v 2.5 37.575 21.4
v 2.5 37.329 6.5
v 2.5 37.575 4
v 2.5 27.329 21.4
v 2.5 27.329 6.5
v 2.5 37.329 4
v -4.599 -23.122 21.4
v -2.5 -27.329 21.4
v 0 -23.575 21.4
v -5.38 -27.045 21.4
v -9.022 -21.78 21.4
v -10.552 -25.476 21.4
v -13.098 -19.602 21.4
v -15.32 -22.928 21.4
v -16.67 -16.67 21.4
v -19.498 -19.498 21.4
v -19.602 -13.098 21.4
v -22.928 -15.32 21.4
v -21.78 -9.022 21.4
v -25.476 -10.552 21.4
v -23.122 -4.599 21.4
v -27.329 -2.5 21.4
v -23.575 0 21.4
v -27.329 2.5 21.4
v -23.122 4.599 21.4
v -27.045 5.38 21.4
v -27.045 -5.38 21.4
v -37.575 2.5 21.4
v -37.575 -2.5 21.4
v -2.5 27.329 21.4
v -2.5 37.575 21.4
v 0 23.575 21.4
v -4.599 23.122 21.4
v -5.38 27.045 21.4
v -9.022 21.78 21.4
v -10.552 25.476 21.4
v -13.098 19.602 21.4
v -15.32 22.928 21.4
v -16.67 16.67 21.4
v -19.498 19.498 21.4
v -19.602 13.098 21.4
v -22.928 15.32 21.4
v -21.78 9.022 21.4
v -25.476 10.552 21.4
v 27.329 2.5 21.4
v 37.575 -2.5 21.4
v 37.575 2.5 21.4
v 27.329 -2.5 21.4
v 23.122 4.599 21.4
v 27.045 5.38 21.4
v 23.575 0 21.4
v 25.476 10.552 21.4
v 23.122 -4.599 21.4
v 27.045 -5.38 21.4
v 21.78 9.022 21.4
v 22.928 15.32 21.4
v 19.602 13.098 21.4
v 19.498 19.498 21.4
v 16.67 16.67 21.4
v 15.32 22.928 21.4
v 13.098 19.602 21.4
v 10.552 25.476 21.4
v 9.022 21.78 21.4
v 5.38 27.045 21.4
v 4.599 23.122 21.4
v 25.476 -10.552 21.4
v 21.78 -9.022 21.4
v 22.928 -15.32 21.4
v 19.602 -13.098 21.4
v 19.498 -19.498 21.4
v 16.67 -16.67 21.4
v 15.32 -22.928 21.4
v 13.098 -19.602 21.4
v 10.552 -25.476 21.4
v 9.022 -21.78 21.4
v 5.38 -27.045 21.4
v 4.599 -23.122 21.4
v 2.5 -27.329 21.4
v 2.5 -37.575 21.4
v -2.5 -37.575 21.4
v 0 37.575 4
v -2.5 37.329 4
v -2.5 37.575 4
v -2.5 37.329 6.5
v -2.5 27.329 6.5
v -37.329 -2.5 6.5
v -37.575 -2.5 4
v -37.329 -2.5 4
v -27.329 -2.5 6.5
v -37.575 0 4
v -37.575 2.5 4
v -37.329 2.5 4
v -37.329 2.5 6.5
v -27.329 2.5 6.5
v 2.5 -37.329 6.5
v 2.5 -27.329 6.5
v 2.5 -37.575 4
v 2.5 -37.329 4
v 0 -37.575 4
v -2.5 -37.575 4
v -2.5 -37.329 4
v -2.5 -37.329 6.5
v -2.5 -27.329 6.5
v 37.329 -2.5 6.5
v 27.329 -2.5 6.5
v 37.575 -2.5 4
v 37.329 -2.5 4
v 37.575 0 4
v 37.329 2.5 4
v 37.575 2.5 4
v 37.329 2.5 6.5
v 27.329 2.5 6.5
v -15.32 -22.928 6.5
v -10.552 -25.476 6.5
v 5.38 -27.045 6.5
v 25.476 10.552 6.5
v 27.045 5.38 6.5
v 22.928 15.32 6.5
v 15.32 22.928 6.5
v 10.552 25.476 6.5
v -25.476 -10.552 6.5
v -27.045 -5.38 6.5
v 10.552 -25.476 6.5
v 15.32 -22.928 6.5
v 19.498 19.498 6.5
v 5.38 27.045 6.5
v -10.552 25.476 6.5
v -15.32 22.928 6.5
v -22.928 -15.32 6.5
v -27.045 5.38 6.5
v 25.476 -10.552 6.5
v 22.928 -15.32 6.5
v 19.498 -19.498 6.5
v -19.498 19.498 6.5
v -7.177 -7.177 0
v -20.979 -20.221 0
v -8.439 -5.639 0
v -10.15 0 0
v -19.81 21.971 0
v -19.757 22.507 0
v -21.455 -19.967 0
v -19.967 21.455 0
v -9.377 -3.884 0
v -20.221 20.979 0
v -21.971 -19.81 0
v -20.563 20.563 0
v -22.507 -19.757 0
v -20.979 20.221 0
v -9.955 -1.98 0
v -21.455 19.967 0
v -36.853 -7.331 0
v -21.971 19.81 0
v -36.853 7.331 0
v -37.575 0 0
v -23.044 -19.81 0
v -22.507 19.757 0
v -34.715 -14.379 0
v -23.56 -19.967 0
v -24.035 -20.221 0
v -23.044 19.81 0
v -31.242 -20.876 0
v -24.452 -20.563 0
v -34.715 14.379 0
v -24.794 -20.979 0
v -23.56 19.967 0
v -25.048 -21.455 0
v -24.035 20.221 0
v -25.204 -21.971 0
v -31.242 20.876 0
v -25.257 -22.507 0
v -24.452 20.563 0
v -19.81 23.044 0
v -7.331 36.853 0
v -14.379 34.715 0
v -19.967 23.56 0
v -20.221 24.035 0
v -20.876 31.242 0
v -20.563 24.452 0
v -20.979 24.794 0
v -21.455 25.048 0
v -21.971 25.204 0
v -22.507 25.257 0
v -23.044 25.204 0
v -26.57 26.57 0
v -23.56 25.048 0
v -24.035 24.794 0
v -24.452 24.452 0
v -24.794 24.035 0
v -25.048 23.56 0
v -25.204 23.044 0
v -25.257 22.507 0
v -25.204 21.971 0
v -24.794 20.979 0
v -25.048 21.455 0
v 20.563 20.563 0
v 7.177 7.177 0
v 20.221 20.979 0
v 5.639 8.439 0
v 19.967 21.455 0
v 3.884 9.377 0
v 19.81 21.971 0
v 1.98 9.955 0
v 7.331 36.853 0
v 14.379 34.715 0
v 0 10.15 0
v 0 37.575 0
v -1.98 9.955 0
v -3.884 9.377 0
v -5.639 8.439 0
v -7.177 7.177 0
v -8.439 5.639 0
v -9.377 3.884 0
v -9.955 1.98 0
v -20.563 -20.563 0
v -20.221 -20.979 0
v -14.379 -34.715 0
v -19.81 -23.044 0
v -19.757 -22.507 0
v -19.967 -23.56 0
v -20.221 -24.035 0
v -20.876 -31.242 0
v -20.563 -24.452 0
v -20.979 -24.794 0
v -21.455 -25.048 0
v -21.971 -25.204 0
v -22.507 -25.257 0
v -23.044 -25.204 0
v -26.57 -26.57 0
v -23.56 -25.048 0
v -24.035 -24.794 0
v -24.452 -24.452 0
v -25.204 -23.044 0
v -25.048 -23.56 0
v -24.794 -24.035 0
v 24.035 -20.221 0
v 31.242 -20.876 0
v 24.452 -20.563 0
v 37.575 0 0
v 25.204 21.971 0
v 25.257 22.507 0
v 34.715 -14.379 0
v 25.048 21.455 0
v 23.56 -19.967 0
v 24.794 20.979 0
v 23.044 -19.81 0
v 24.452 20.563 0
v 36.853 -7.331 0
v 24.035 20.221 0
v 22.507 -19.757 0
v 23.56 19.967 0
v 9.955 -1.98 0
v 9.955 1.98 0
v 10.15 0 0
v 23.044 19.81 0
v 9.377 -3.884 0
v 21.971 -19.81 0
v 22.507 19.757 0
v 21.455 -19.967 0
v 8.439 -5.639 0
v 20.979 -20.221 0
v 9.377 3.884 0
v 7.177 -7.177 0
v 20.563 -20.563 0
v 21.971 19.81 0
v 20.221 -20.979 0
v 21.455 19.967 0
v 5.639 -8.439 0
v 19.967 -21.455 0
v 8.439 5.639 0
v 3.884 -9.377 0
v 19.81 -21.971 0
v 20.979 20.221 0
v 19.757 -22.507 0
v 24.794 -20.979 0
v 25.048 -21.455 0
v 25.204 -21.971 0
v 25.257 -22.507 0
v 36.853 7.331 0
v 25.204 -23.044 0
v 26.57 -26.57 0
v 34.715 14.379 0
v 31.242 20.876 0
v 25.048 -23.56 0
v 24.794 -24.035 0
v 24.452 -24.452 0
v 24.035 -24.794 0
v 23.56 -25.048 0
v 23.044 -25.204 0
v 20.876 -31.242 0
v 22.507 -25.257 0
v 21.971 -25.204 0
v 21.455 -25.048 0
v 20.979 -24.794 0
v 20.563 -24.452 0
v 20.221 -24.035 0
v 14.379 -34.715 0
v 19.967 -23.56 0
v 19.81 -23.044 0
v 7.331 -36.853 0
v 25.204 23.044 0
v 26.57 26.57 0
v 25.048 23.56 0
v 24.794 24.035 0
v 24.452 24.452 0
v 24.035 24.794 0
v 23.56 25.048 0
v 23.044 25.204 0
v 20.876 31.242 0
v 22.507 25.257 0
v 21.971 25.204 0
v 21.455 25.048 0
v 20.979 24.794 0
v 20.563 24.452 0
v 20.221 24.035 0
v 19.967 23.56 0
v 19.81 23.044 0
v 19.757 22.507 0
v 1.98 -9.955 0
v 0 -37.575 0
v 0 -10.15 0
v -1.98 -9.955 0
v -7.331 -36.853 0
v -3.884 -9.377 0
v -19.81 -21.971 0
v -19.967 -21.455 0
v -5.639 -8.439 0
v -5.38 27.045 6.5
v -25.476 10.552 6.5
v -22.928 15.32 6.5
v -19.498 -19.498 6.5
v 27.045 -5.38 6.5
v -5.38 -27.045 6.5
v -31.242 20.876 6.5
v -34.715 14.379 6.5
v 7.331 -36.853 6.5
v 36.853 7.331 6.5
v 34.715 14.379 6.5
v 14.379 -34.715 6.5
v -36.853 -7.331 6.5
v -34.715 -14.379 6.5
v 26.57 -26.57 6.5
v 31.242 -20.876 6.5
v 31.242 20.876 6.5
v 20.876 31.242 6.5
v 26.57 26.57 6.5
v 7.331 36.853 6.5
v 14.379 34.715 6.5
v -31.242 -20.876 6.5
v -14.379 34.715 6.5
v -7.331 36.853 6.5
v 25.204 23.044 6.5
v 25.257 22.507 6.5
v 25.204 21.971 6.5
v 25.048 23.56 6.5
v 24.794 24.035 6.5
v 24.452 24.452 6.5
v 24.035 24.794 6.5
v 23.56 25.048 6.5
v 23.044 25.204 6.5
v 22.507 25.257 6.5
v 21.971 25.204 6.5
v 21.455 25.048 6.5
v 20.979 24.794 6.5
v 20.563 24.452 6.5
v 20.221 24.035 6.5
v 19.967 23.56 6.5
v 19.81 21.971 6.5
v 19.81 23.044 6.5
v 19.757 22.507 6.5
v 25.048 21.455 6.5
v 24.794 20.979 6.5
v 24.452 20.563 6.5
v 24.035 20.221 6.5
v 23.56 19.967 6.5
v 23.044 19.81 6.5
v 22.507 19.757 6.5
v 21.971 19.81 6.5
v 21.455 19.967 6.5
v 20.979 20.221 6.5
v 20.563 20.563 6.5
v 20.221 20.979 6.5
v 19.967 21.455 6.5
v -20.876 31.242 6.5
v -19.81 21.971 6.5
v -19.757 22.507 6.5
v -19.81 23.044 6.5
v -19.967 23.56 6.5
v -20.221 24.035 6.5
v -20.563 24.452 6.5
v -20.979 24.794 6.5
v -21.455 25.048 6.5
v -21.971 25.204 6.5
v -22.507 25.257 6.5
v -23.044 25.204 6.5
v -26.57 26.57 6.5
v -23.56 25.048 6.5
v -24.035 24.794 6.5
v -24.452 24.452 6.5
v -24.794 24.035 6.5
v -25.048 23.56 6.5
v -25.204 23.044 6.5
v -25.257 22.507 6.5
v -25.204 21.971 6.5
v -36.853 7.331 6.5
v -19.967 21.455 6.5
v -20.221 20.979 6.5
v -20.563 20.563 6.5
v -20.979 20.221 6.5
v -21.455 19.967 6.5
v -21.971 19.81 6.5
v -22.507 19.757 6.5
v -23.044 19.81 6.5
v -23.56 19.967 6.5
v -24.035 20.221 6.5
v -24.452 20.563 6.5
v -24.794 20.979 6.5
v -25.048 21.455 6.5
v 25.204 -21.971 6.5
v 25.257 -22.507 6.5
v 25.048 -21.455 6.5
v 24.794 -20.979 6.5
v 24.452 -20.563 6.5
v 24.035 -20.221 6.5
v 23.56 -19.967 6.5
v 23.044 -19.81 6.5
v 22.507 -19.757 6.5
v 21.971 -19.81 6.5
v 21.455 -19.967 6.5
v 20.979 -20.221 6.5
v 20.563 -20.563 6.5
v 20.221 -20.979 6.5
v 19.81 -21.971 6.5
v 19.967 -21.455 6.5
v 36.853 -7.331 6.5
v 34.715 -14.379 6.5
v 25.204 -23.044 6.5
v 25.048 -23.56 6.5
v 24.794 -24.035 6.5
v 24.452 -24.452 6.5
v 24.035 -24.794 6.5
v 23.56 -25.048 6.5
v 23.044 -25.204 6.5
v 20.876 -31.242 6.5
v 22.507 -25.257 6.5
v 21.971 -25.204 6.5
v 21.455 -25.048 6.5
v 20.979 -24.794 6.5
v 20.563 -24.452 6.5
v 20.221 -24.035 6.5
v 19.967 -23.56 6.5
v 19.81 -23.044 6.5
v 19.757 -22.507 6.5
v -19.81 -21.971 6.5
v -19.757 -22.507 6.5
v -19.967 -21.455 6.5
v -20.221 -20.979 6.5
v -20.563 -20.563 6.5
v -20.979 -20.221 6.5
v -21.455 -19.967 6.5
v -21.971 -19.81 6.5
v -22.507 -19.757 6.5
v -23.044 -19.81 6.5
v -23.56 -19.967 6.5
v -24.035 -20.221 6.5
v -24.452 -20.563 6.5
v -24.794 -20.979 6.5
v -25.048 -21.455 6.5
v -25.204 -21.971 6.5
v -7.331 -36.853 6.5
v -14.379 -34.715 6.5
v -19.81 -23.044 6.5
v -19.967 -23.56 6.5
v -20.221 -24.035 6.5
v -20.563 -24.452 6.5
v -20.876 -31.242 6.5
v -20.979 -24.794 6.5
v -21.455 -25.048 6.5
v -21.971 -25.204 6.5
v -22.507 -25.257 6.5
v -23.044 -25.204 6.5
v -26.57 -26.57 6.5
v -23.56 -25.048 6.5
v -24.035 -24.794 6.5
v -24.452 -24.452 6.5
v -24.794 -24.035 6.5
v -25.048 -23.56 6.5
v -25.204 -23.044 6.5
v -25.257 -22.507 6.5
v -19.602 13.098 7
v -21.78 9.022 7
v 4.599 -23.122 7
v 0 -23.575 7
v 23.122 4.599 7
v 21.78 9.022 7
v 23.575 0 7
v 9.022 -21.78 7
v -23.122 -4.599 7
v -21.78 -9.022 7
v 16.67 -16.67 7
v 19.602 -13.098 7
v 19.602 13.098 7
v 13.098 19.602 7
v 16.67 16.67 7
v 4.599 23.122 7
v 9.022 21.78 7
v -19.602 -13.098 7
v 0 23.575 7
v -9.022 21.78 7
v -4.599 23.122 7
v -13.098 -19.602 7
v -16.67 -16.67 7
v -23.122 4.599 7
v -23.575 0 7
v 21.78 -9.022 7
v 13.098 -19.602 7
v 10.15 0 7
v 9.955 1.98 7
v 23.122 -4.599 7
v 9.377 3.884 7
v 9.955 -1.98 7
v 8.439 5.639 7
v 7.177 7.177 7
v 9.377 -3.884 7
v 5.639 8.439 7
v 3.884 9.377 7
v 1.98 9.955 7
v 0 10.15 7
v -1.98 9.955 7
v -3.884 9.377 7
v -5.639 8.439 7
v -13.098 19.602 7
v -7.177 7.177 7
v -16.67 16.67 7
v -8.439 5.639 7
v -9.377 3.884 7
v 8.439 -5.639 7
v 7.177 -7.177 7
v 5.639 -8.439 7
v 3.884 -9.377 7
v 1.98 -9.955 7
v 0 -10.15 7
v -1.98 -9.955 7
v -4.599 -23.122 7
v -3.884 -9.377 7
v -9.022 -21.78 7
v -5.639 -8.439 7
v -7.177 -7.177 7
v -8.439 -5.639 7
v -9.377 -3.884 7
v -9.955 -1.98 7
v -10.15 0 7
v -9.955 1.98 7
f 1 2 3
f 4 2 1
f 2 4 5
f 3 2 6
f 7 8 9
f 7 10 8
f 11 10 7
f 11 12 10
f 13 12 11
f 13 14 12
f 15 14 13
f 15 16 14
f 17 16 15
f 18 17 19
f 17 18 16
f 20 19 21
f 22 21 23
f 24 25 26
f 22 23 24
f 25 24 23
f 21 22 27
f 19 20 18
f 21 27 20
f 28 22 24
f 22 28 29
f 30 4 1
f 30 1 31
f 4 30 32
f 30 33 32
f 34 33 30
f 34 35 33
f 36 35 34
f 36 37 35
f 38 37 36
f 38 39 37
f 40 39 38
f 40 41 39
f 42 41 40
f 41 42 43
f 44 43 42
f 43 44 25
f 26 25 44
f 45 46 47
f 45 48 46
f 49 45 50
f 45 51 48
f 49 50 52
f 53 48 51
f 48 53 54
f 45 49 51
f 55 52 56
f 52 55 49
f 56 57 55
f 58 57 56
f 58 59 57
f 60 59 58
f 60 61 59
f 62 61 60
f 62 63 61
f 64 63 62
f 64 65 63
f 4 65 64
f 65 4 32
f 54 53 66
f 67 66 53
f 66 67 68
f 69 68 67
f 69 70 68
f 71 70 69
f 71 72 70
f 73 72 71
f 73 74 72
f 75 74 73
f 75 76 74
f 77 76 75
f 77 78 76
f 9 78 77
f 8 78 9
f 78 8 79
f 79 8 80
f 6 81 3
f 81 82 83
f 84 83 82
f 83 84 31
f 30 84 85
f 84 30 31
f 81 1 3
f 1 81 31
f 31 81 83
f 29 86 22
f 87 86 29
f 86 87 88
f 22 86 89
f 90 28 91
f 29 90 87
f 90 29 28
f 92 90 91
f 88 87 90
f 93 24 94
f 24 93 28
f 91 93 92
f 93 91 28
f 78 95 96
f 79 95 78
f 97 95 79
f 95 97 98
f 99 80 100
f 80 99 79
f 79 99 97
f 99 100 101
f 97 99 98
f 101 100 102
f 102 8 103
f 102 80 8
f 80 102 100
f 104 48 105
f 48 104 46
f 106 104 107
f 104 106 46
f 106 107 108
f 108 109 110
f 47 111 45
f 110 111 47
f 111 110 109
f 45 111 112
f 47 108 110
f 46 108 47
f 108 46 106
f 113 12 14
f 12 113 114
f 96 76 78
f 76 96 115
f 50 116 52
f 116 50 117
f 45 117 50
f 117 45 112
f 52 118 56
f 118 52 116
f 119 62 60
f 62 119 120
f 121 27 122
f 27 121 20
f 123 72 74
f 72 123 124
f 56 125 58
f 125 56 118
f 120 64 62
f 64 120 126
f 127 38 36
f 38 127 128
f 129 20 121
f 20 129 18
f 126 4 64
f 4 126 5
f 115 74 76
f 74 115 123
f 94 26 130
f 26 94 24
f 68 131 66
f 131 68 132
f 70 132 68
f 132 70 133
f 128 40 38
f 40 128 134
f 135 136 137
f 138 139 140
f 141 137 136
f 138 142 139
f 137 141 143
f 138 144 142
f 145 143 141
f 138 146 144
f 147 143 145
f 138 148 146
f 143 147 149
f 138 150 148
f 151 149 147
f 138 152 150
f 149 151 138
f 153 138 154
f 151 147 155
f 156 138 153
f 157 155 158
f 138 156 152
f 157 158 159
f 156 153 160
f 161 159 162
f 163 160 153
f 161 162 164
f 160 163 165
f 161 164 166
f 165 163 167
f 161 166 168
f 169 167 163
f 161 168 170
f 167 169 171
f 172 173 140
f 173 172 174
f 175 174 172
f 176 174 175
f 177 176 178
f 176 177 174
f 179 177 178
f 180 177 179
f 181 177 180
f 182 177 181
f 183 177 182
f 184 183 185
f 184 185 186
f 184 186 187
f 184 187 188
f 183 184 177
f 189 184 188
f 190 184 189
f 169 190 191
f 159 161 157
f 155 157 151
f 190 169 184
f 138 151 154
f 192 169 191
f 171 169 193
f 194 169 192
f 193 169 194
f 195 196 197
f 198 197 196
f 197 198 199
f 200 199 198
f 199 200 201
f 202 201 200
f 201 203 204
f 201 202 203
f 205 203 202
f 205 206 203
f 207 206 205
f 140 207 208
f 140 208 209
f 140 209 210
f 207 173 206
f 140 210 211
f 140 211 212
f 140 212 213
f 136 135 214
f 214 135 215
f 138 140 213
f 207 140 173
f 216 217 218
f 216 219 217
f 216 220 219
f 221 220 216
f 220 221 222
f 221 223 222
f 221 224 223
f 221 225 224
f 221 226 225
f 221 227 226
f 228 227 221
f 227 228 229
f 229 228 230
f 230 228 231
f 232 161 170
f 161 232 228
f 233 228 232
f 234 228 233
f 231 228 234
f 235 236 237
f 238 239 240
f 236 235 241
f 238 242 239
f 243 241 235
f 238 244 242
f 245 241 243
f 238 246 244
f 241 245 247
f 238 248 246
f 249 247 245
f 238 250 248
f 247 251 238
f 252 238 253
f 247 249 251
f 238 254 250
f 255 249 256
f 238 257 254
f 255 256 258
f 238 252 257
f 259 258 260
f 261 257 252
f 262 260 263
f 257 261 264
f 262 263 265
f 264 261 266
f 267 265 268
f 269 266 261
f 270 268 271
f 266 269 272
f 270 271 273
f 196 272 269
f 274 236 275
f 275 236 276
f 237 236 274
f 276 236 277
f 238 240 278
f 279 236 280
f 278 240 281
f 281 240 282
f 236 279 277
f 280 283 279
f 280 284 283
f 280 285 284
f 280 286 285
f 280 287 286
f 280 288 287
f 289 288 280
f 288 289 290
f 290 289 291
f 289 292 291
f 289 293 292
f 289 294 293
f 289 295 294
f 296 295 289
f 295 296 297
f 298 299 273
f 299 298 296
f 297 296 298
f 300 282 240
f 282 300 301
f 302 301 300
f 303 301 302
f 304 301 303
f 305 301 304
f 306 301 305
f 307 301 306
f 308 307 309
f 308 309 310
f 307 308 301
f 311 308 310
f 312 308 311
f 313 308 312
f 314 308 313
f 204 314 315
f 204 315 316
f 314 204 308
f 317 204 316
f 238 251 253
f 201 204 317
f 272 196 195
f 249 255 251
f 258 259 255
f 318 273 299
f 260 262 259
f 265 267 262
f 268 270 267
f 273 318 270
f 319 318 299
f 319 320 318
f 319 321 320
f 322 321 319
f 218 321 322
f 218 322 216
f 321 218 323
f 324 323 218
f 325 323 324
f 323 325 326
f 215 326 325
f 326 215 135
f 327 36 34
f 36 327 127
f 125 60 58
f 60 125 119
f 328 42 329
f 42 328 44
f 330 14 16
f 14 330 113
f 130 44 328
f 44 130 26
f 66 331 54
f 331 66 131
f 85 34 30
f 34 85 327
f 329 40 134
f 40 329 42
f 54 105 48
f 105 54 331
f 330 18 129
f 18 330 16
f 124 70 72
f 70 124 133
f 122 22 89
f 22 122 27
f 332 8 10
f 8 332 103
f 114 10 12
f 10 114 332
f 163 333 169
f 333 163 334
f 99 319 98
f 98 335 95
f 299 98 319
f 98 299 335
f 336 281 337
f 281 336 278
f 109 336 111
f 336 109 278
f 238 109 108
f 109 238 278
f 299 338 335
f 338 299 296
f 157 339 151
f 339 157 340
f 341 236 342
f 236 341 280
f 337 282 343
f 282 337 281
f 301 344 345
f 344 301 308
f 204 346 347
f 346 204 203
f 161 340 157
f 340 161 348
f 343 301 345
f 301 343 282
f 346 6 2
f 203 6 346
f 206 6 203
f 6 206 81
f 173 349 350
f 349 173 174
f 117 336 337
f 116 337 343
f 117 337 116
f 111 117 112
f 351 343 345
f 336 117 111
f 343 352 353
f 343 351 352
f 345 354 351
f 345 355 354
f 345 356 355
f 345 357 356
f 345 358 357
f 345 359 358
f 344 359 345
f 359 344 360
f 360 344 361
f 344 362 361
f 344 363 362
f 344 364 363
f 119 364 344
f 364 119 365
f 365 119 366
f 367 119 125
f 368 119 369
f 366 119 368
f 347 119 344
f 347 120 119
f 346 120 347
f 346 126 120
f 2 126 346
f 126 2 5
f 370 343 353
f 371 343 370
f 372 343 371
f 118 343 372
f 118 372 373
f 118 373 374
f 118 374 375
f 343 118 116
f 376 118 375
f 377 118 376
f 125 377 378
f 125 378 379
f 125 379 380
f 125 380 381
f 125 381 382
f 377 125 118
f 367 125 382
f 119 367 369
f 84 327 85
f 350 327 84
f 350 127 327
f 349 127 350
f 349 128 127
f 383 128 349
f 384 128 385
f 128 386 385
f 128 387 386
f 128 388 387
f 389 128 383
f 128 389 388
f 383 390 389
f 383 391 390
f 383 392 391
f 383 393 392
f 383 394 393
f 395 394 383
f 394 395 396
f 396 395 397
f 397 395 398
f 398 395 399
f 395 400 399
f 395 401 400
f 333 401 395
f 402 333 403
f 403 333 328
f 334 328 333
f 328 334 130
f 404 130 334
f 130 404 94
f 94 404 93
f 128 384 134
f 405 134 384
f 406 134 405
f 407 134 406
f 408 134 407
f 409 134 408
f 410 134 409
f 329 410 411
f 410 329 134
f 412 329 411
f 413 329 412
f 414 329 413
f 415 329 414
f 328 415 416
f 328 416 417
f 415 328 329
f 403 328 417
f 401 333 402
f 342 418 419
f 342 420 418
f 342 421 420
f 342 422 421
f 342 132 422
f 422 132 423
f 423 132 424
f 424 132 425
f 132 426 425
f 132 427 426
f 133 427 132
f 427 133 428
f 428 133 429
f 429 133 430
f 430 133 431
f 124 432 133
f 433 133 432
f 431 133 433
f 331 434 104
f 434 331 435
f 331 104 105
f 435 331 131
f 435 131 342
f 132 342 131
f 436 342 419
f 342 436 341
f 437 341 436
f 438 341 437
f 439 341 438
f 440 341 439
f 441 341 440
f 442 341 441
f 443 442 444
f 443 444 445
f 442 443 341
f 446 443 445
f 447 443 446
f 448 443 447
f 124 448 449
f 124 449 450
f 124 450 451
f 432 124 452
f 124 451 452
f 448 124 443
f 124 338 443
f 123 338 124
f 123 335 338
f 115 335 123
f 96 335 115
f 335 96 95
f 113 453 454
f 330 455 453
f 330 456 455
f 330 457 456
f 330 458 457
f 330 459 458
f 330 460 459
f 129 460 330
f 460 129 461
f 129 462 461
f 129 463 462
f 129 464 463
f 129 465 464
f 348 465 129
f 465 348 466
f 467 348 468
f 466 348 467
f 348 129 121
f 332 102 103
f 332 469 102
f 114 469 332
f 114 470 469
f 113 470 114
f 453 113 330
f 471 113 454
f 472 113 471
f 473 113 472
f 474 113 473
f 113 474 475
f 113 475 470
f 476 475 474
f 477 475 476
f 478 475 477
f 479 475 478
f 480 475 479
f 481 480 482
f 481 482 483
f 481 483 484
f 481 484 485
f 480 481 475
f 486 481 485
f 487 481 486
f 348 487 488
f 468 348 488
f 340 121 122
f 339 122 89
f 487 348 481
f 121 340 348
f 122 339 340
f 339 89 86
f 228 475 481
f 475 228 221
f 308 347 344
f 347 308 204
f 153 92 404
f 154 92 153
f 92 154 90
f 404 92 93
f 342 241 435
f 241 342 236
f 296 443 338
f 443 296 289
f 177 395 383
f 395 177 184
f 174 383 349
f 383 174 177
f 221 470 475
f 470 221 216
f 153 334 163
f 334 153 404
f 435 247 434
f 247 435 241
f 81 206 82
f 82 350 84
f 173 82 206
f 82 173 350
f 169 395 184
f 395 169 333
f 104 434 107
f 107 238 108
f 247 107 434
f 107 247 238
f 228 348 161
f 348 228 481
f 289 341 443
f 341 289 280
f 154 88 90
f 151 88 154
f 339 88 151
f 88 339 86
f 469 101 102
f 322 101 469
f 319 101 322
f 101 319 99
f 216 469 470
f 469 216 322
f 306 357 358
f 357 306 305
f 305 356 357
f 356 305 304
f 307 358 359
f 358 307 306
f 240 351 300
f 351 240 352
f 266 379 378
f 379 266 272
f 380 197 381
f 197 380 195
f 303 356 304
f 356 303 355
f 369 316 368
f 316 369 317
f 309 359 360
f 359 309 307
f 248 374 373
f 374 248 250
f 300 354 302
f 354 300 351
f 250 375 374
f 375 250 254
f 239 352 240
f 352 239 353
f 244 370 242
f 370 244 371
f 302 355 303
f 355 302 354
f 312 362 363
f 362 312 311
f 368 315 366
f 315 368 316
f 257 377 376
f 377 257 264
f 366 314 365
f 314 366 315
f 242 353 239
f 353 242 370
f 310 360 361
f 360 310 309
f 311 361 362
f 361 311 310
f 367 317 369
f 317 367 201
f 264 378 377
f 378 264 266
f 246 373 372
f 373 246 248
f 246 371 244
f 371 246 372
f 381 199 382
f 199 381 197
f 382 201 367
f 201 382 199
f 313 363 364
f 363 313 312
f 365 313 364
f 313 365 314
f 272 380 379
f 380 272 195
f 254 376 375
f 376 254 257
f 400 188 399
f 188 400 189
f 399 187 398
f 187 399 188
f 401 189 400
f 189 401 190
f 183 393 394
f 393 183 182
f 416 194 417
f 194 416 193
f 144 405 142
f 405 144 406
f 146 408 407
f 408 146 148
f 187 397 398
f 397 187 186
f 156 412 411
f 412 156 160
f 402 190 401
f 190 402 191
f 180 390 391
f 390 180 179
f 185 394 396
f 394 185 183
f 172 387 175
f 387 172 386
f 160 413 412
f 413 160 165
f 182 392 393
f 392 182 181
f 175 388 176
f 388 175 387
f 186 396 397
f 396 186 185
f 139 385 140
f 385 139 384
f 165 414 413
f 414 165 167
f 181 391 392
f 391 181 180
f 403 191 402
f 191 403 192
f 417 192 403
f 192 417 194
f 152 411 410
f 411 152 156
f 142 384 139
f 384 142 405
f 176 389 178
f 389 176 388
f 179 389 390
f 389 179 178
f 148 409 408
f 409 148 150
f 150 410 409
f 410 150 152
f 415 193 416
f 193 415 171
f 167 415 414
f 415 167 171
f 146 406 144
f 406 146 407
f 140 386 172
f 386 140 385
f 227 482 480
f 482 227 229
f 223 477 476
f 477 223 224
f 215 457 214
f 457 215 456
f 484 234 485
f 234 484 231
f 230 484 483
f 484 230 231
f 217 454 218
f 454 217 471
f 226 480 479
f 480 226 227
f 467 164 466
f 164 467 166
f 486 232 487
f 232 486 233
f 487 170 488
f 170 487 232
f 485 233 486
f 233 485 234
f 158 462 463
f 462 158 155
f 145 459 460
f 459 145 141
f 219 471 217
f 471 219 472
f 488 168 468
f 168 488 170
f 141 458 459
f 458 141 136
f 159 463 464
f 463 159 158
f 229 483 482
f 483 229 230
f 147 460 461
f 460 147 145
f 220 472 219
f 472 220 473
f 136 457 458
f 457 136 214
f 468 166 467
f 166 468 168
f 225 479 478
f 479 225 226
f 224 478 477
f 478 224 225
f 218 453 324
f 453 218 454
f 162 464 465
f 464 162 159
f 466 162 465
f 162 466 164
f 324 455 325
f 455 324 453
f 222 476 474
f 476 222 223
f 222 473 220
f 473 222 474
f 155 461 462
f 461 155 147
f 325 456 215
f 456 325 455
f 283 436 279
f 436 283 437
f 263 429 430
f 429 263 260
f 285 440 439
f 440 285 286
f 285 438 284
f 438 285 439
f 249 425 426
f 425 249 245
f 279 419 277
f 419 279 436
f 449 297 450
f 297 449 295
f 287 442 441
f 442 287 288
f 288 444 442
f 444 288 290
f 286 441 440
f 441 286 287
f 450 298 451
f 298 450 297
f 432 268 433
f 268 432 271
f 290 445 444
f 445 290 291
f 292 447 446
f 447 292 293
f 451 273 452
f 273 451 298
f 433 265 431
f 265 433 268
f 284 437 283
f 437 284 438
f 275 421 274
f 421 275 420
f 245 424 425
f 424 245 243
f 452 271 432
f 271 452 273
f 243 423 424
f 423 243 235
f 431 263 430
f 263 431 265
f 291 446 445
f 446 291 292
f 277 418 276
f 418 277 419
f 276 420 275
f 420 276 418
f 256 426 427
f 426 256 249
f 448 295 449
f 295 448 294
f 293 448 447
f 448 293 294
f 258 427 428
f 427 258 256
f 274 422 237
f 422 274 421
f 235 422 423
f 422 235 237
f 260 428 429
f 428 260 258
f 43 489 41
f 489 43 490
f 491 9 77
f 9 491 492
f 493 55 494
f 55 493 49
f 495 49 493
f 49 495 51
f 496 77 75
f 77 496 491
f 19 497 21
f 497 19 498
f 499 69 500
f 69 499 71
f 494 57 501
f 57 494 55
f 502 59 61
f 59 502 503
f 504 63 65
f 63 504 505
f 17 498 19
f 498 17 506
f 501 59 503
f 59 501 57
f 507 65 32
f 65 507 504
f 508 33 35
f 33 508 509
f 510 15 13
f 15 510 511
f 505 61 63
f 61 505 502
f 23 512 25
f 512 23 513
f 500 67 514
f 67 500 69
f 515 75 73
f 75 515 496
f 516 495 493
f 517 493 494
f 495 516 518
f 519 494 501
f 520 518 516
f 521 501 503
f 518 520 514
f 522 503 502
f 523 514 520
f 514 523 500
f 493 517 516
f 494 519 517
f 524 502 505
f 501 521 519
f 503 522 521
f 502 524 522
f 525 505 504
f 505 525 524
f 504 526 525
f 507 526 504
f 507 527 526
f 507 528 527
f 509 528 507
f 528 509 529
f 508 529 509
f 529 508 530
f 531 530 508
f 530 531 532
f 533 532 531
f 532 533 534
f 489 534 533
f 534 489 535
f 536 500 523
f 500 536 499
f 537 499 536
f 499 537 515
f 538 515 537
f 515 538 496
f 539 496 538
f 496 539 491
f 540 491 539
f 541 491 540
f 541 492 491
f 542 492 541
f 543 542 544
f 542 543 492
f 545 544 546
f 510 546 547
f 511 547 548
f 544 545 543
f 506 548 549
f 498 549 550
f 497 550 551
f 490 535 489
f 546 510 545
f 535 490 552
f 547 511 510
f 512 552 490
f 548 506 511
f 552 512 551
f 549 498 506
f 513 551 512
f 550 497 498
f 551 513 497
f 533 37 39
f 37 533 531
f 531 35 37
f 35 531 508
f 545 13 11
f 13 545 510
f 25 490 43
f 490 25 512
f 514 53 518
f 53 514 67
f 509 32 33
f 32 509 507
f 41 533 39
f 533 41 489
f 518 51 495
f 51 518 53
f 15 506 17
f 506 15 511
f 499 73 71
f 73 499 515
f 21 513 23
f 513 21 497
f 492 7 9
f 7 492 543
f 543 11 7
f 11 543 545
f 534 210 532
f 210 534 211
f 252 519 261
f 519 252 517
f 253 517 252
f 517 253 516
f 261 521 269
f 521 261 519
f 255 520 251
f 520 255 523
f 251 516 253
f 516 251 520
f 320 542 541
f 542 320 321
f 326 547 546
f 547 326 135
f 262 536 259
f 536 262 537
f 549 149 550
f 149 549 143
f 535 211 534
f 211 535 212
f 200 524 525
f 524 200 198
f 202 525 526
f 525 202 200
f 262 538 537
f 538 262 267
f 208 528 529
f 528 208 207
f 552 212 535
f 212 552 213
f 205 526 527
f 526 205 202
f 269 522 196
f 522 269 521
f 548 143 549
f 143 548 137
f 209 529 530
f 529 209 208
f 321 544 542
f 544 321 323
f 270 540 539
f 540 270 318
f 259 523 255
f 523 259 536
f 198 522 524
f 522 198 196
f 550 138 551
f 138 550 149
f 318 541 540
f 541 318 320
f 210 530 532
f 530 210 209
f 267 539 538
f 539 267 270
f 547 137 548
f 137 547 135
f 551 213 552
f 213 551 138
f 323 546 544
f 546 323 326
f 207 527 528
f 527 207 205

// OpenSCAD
$fn = 32;

// ----------------------------------------------------------------------
// Bearing housing: seat for 6204 (47 x 14 mm), 55.15 mm body
// ----------------------------------------------------------------------

// --- parameters (mm) ---
body_od = 55.15;          // housing outside diameter
body_h = 21.4;            // overall housing height
wall = 4;                 // wall thickness
pocket_d = 47.15;         // 6204 seat, 0.15 mm clearance
seat_h = 14.4;            // pocket depth
shoulder = 2;             // shoulder under the bearing
pass_d = 20.3;            // shaft passage
flange_dia = 75.15;       // mounting flange diameter
flange_t = 5;             // flange thickness
bolt_d = 5.5;             // flange bolt clearance
bolt_r = 31.83;           // flange bolt circle radius
rib_w = 5;                // rib width
rib_n = 4;                // rib count

module body() {
  cylinder(h = body_h, d = body_od);
}

module flange() {
  /* flange sunk 1.5 mm into the body */
  cylinder(h = flange_t + 1.5, d = flange_dia);
}

module ribs() {
  for (i = [0 : rib_n - 1])
    rotate([0, 0, i * 360 / rib_n])
      translate([-rib_w / 2, body_od / 2 - 0.8, flange_t - 1])
        cube([rib_w, (flange_dia - body_od) / 2 + 0.8, body_h - flange_t + 1]);
}

difference() {
  union() {
    body();
    flange();
    ribs();
  }
  translate([0, 0, body_h - seat_h]) cylinder(h = seat_h + 1, d = pocket_d);
  translate([0, 0, -1]) cylinder(h = body_h - seat_h + 1, d = pass_d);
  for (i = [0 : 3]) rotate([0, 0, 45 + i * 90]) translate([bolt_r, 0, -1])
    cylinder(h = flange_t + 3, d = bolt_d);
}
